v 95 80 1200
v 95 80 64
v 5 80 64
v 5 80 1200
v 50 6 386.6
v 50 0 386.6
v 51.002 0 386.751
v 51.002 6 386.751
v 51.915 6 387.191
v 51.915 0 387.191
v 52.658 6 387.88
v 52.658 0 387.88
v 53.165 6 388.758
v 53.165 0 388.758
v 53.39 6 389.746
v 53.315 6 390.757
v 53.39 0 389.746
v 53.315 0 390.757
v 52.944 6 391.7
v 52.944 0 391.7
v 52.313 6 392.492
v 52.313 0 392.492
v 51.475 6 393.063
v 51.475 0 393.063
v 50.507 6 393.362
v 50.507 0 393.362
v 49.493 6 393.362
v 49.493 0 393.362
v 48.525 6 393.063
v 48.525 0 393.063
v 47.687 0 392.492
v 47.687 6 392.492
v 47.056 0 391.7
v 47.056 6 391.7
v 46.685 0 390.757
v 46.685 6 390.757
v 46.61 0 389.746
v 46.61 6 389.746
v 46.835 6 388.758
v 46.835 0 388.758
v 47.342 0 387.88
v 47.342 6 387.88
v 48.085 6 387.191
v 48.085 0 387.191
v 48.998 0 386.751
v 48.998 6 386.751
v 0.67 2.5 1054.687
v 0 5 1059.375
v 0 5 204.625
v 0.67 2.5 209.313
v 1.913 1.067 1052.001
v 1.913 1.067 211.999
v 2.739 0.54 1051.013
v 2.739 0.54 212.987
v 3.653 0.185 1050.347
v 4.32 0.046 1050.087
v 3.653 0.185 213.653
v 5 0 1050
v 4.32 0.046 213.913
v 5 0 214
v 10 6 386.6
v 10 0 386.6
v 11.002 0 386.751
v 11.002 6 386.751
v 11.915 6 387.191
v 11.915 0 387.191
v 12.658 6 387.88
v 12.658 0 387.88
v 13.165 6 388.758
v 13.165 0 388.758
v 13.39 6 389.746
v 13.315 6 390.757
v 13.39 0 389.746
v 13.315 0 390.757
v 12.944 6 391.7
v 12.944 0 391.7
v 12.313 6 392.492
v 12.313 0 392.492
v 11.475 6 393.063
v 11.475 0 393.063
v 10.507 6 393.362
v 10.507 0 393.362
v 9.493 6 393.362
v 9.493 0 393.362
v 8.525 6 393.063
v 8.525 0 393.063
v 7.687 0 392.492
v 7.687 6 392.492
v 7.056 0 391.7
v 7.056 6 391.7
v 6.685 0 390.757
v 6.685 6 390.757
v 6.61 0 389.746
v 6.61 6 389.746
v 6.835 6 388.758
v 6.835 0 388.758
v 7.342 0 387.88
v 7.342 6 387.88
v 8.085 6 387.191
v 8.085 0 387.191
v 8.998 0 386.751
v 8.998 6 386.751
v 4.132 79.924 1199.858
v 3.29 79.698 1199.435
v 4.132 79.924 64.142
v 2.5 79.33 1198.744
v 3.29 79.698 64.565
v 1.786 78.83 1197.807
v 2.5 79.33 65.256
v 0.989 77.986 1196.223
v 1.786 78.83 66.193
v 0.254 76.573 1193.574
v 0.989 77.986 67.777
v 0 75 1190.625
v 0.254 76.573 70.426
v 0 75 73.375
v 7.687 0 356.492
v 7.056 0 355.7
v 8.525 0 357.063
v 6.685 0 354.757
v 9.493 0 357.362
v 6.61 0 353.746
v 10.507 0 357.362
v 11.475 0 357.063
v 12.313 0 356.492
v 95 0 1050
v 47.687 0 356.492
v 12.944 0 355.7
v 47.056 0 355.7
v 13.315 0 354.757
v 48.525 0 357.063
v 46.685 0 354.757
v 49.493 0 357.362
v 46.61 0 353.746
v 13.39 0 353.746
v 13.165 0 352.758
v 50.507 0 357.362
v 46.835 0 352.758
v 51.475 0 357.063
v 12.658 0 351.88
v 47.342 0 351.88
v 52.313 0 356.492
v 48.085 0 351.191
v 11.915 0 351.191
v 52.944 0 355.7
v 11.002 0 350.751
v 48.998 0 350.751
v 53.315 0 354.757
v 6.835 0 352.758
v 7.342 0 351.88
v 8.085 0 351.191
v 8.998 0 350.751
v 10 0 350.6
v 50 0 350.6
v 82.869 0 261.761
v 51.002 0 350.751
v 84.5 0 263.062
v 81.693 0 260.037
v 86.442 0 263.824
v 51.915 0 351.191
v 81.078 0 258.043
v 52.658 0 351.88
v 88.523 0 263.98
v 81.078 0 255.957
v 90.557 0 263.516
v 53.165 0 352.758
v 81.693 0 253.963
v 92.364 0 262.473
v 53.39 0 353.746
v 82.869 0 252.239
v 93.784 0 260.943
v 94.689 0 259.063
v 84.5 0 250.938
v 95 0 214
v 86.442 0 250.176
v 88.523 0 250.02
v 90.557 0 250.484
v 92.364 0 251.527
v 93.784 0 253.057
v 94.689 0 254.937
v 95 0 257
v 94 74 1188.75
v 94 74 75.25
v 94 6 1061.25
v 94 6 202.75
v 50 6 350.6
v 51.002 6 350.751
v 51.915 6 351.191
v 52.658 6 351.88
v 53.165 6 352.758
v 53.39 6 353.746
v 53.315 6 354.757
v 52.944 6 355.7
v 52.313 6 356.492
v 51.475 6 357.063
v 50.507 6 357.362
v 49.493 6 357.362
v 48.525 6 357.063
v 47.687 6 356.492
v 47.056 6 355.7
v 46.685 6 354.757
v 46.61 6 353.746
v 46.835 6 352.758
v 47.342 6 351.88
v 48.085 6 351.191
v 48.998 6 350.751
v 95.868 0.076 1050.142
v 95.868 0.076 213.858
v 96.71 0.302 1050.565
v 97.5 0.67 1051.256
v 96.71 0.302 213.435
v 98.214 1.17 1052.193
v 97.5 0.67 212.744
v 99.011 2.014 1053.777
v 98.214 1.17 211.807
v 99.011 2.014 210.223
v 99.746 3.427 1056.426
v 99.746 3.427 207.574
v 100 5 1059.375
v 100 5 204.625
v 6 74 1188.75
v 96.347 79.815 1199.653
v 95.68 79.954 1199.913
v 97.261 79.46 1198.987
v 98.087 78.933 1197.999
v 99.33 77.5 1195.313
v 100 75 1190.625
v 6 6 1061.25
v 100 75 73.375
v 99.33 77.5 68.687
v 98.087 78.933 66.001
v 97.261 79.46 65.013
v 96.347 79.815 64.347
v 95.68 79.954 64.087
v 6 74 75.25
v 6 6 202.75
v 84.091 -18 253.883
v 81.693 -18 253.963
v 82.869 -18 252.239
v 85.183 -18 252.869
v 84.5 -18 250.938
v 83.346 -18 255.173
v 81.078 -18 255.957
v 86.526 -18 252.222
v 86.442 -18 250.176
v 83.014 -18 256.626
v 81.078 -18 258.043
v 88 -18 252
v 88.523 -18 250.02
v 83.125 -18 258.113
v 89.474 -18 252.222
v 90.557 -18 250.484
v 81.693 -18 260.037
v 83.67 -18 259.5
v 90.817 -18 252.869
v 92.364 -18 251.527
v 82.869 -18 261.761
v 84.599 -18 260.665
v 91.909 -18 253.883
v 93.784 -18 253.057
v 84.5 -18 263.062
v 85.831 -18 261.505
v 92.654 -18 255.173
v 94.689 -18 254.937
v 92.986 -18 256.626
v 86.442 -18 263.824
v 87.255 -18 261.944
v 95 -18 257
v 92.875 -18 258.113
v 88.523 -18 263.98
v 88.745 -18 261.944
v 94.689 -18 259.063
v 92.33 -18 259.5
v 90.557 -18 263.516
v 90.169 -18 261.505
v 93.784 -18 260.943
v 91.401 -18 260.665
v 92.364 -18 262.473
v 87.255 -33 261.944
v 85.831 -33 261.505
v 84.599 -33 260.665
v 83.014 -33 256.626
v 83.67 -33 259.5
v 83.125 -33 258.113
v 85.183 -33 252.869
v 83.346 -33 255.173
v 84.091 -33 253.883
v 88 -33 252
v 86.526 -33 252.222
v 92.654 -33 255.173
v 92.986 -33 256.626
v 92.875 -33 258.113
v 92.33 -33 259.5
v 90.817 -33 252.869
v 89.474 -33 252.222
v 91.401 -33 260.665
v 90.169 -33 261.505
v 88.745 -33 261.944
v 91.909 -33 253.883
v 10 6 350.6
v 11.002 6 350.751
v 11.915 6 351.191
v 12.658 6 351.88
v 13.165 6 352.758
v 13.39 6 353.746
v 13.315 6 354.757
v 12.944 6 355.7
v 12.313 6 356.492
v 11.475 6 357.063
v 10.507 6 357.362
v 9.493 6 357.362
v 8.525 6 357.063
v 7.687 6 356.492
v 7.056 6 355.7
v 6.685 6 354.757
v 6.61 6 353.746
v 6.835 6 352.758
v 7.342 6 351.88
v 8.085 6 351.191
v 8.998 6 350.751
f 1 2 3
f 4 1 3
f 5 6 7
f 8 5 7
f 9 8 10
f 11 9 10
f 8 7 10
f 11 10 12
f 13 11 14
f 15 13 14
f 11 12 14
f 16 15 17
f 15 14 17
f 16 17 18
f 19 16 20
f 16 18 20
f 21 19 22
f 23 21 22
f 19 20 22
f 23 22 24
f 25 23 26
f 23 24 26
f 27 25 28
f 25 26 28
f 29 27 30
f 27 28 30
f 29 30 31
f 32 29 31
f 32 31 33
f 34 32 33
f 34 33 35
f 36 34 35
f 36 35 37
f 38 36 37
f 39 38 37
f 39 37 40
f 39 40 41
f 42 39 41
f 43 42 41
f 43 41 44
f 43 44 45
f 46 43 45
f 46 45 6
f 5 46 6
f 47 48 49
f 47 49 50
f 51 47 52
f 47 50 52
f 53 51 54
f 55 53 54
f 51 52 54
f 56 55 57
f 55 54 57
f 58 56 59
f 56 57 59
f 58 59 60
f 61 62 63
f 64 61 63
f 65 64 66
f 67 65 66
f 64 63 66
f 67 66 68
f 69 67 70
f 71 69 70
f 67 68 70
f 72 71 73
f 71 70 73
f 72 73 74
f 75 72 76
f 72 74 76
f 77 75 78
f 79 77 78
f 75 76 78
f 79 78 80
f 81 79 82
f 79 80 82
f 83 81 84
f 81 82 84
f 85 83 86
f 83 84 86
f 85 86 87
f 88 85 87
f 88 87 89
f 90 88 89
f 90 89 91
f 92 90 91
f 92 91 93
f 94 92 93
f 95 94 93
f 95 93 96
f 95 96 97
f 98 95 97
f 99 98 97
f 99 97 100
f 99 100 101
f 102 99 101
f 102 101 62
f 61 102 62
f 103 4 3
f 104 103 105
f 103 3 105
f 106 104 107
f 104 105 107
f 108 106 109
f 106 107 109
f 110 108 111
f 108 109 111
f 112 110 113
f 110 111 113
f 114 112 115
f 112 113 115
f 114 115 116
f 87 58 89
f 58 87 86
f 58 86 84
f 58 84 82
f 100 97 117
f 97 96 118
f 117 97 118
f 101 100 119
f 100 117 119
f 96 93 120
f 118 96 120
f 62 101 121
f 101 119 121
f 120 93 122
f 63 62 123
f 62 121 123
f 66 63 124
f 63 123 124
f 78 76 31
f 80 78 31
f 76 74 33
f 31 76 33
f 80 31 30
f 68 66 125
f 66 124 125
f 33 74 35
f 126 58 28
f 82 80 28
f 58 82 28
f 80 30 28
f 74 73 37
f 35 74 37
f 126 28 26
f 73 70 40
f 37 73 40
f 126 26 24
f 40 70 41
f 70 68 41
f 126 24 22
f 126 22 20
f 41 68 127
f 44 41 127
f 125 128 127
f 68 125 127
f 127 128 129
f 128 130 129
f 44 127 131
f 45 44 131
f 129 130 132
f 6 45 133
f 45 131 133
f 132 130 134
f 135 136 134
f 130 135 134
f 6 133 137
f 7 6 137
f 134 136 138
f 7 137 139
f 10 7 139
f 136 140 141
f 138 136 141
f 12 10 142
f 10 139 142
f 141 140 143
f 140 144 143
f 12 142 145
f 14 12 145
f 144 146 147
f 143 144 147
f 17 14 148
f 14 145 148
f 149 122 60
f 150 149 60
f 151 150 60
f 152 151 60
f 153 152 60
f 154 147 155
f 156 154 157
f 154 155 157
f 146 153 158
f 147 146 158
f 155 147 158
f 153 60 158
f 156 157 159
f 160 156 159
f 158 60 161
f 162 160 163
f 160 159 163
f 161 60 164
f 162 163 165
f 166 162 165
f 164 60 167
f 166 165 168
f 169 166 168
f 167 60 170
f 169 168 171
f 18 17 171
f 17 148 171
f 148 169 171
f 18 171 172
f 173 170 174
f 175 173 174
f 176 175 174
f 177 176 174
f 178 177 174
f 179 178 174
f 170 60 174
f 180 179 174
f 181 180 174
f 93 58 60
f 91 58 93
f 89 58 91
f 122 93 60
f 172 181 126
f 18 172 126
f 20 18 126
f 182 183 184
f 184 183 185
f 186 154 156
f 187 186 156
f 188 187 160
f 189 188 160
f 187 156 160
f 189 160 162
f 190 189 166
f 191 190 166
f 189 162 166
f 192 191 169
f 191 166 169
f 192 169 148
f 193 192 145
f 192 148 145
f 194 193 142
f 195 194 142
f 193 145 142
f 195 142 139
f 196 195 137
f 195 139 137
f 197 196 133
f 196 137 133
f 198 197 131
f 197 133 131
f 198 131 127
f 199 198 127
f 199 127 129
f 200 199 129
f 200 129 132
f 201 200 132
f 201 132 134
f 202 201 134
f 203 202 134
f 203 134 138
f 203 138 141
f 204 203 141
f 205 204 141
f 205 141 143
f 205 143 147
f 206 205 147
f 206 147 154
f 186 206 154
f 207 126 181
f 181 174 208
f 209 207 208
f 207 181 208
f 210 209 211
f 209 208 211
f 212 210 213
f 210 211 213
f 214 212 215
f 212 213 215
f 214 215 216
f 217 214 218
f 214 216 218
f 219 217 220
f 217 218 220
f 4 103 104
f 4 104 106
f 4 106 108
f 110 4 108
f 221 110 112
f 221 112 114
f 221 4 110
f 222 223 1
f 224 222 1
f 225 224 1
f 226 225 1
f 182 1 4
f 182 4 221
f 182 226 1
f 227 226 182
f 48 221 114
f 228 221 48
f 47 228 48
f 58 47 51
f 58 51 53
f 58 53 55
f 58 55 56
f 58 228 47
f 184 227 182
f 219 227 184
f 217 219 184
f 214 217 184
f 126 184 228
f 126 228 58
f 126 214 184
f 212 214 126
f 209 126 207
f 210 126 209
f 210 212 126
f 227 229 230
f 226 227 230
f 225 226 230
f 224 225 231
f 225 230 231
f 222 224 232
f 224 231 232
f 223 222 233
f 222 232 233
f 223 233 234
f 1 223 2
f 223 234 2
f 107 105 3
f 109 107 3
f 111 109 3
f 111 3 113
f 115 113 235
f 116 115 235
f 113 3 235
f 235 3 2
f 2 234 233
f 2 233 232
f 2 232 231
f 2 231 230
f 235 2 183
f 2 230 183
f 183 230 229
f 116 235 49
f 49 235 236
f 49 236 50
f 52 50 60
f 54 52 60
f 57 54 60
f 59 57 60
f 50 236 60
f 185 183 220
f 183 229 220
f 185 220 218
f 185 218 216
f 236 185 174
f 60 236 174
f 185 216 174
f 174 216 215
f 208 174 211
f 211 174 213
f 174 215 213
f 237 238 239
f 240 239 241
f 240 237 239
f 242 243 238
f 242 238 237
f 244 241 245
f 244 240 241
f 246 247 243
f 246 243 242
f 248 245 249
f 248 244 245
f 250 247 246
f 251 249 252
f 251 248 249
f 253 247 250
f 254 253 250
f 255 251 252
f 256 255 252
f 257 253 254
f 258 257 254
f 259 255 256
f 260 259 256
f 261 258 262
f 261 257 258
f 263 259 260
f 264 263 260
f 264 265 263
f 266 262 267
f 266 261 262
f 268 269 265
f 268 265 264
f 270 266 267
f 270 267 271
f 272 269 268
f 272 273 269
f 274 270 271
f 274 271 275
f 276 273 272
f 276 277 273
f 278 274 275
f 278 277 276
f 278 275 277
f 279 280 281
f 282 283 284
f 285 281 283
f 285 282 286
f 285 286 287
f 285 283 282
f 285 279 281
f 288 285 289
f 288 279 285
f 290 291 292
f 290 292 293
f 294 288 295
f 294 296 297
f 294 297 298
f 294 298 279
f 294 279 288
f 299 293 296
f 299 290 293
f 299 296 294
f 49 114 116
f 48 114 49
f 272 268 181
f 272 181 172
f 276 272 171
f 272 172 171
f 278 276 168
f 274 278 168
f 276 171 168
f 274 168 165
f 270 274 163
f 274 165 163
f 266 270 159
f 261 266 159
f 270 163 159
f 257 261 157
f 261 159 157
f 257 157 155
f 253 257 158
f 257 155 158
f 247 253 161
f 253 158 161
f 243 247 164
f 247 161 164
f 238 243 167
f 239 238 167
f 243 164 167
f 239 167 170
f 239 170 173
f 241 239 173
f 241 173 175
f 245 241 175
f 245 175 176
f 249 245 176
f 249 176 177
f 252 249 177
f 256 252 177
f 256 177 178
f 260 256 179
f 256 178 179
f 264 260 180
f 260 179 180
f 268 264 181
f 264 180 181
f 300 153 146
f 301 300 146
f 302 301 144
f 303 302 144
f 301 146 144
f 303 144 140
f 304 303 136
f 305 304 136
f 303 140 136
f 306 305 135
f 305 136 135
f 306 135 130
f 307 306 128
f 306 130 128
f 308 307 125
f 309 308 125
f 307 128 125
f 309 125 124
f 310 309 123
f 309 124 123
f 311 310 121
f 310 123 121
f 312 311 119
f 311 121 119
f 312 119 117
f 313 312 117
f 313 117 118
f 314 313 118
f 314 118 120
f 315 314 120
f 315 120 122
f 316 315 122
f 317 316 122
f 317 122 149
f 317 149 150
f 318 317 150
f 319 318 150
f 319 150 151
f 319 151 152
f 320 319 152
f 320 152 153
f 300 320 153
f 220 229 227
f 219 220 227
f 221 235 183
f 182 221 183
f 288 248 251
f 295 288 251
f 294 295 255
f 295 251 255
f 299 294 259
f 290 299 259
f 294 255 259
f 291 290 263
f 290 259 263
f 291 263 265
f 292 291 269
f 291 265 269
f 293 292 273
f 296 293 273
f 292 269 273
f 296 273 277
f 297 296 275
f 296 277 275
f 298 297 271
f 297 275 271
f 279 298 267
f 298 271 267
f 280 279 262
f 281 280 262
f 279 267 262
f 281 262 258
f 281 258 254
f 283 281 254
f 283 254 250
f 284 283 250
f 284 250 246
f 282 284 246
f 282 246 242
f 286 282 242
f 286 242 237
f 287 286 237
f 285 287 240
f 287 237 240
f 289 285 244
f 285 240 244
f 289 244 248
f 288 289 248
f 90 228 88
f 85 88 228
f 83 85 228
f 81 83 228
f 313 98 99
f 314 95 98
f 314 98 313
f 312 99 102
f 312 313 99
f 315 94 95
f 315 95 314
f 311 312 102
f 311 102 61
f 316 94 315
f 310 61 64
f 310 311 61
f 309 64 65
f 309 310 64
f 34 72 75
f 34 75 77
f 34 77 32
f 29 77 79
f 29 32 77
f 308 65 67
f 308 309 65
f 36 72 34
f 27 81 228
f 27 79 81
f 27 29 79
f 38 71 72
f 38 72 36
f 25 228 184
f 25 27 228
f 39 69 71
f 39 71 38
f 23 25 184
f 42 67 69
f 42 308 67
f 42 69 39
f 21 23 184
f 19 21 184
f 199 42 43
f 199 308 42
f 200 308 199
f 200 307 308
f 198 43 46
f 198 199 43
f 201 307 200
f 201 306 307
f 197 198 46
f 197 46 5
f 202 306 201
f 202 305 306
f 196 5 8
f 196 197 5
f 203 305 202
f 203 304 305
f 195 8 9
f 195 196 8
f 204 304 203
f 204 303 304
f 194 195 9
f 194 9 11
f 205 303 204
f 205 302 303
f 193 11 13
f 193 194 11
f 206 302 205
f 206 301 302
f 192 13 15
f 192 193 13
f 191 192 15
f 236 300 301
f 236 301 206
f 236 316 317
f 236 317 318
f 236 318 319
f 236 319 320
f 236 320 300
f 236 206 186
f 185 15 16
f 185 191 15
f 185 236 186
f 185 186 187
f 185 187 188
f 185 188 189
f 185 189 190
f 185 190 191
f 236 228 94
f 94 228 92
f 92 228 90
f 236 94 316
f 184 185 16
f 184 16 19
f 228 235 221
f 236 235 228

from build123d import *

# Parameters (mm, degrees)
SCHIZZO1_W                   = 88
SCHIZZO1_H                   = 68
ESTRUSIONE_SOTTILE1_DEPTH    = 1200
ESTRUSIONE1_DEPTH            = 1207.813987324
SCHIZZO3_R                   = 3.4
TAGLIO_ESTRUSIONE1_DEPTH     = 10
RIPETIZIONE_A_L1_COUNT       = 2
RIPETIZIONE_A_L1_PITCH       = 40
RIPETIZIONE_A_L1_COUNT_DIR2  = 2
RIPETIZIONE_A_L1_PITCH_DIR2  = 36
SCHIZZO4_R                   = 7
ESTRUSIONE_ESTRUSIONE1_DEPTH = 18
SCHIZZO5_R                   = 5
ESTRUSIONE_ESTRUSIONE2_DEPTH = 15


with BuildPart() as part:
    # Schizzo1 → Estrusione-Sottile1 (new body)
    with BuildSketch(Plane.XY):
        with BuildLine():
            Line((5, 0), (95, 0))
            ThreePointArc((95, 0), (98.535533906, 1.464466094), (100, 5))
            Line((100, 5), (100, 75))
            ThreePointArc((100, 75), (98.535533906, 78.535533906), (95, 80))
            Line((95, 80), (5, 80))
            ThreePointArc((5, 80), (1.464466094, 78.535533906), (0, 75))
            Line((0, 75), (0, 5))
            ThreePointArc((0, 5), (1.464466094, 1.464466094), (5, 0))
        make_face()
        with Locations((50, 40)):
            Rectangle(SCHIZZO1_W, SCHIZZO1_H, mode=Mode.SUBTRACT)
    extrude(amount=ESTRUSIONE_SOTTILE1_DEPTH)

    # Schizzo2 → Estrusione1 (cut, through all)
    with BuildSketch(Plane(origin=(100, 0, 0), x_dir=(0, 0, -1), z_dir=(1, 0, 0))):
        Polygon((-1200, 80), (-1050, 0), (-1200, 0), align=None)
        Polygon((-64, 80), (-214, 0), (0, 0), (0, 80), align=None)
    extrude(amount=-ESTRUSIONE1_DEPTH, mode=Mode.SUBTRACT)

    # Schizzo3 → Taglio-Estrusione1 (cut)
    with BuildSketch(Plane.XZ):
        with Locations(Location((10, 354, 0), (0, 0, 270))):
            Circle(SCHIZZO3_R)
    taglio_estrusione1 = extrude(amount=-TAGLIO_ESTRUSIONE1_DEPTH, mode=Mode.SUBTRACT)

    # Ripetizione a L1: Taglio-Estrusione1 2 × 2
    with Locations(*[(i * RIPETIZIONE_A_L1_PITCH, 0, j * RIPETIZIONE_A_L1_PITCH_DIR2) for i in range(RIPETIZIONE_A_L1_COUNT) for j in range(RIPETIZIONE_A_L1_COUNT_DIR2) if (i, j) != (0, 0)]):
        add(taglio_estrusione1, mode=Mode.SUBTRACT)

    # Schizzo4 → Estrusione-Estrusione1 (add)
    with BuildSketch(Plane.XZ):
        with Locations((88, 257)):
            Circle(SCHIZZO4_R)
    extrude(amount=ESTRUSIONE_ESTRUSIONE1_DEPTH)

    # Schizzo5 → Estrusione-Estrusione2 (add)
    with BuildSketch(Plane.XZ.offset(18)):
        with Locations(Location((88, 257, 0), (0, 0, 270))):
            Circle(SCHIZZO5_R)
    extrude(amount=ESTRUSIONE_ESTRUSIONE2_DEPTH)


solid = part.part
